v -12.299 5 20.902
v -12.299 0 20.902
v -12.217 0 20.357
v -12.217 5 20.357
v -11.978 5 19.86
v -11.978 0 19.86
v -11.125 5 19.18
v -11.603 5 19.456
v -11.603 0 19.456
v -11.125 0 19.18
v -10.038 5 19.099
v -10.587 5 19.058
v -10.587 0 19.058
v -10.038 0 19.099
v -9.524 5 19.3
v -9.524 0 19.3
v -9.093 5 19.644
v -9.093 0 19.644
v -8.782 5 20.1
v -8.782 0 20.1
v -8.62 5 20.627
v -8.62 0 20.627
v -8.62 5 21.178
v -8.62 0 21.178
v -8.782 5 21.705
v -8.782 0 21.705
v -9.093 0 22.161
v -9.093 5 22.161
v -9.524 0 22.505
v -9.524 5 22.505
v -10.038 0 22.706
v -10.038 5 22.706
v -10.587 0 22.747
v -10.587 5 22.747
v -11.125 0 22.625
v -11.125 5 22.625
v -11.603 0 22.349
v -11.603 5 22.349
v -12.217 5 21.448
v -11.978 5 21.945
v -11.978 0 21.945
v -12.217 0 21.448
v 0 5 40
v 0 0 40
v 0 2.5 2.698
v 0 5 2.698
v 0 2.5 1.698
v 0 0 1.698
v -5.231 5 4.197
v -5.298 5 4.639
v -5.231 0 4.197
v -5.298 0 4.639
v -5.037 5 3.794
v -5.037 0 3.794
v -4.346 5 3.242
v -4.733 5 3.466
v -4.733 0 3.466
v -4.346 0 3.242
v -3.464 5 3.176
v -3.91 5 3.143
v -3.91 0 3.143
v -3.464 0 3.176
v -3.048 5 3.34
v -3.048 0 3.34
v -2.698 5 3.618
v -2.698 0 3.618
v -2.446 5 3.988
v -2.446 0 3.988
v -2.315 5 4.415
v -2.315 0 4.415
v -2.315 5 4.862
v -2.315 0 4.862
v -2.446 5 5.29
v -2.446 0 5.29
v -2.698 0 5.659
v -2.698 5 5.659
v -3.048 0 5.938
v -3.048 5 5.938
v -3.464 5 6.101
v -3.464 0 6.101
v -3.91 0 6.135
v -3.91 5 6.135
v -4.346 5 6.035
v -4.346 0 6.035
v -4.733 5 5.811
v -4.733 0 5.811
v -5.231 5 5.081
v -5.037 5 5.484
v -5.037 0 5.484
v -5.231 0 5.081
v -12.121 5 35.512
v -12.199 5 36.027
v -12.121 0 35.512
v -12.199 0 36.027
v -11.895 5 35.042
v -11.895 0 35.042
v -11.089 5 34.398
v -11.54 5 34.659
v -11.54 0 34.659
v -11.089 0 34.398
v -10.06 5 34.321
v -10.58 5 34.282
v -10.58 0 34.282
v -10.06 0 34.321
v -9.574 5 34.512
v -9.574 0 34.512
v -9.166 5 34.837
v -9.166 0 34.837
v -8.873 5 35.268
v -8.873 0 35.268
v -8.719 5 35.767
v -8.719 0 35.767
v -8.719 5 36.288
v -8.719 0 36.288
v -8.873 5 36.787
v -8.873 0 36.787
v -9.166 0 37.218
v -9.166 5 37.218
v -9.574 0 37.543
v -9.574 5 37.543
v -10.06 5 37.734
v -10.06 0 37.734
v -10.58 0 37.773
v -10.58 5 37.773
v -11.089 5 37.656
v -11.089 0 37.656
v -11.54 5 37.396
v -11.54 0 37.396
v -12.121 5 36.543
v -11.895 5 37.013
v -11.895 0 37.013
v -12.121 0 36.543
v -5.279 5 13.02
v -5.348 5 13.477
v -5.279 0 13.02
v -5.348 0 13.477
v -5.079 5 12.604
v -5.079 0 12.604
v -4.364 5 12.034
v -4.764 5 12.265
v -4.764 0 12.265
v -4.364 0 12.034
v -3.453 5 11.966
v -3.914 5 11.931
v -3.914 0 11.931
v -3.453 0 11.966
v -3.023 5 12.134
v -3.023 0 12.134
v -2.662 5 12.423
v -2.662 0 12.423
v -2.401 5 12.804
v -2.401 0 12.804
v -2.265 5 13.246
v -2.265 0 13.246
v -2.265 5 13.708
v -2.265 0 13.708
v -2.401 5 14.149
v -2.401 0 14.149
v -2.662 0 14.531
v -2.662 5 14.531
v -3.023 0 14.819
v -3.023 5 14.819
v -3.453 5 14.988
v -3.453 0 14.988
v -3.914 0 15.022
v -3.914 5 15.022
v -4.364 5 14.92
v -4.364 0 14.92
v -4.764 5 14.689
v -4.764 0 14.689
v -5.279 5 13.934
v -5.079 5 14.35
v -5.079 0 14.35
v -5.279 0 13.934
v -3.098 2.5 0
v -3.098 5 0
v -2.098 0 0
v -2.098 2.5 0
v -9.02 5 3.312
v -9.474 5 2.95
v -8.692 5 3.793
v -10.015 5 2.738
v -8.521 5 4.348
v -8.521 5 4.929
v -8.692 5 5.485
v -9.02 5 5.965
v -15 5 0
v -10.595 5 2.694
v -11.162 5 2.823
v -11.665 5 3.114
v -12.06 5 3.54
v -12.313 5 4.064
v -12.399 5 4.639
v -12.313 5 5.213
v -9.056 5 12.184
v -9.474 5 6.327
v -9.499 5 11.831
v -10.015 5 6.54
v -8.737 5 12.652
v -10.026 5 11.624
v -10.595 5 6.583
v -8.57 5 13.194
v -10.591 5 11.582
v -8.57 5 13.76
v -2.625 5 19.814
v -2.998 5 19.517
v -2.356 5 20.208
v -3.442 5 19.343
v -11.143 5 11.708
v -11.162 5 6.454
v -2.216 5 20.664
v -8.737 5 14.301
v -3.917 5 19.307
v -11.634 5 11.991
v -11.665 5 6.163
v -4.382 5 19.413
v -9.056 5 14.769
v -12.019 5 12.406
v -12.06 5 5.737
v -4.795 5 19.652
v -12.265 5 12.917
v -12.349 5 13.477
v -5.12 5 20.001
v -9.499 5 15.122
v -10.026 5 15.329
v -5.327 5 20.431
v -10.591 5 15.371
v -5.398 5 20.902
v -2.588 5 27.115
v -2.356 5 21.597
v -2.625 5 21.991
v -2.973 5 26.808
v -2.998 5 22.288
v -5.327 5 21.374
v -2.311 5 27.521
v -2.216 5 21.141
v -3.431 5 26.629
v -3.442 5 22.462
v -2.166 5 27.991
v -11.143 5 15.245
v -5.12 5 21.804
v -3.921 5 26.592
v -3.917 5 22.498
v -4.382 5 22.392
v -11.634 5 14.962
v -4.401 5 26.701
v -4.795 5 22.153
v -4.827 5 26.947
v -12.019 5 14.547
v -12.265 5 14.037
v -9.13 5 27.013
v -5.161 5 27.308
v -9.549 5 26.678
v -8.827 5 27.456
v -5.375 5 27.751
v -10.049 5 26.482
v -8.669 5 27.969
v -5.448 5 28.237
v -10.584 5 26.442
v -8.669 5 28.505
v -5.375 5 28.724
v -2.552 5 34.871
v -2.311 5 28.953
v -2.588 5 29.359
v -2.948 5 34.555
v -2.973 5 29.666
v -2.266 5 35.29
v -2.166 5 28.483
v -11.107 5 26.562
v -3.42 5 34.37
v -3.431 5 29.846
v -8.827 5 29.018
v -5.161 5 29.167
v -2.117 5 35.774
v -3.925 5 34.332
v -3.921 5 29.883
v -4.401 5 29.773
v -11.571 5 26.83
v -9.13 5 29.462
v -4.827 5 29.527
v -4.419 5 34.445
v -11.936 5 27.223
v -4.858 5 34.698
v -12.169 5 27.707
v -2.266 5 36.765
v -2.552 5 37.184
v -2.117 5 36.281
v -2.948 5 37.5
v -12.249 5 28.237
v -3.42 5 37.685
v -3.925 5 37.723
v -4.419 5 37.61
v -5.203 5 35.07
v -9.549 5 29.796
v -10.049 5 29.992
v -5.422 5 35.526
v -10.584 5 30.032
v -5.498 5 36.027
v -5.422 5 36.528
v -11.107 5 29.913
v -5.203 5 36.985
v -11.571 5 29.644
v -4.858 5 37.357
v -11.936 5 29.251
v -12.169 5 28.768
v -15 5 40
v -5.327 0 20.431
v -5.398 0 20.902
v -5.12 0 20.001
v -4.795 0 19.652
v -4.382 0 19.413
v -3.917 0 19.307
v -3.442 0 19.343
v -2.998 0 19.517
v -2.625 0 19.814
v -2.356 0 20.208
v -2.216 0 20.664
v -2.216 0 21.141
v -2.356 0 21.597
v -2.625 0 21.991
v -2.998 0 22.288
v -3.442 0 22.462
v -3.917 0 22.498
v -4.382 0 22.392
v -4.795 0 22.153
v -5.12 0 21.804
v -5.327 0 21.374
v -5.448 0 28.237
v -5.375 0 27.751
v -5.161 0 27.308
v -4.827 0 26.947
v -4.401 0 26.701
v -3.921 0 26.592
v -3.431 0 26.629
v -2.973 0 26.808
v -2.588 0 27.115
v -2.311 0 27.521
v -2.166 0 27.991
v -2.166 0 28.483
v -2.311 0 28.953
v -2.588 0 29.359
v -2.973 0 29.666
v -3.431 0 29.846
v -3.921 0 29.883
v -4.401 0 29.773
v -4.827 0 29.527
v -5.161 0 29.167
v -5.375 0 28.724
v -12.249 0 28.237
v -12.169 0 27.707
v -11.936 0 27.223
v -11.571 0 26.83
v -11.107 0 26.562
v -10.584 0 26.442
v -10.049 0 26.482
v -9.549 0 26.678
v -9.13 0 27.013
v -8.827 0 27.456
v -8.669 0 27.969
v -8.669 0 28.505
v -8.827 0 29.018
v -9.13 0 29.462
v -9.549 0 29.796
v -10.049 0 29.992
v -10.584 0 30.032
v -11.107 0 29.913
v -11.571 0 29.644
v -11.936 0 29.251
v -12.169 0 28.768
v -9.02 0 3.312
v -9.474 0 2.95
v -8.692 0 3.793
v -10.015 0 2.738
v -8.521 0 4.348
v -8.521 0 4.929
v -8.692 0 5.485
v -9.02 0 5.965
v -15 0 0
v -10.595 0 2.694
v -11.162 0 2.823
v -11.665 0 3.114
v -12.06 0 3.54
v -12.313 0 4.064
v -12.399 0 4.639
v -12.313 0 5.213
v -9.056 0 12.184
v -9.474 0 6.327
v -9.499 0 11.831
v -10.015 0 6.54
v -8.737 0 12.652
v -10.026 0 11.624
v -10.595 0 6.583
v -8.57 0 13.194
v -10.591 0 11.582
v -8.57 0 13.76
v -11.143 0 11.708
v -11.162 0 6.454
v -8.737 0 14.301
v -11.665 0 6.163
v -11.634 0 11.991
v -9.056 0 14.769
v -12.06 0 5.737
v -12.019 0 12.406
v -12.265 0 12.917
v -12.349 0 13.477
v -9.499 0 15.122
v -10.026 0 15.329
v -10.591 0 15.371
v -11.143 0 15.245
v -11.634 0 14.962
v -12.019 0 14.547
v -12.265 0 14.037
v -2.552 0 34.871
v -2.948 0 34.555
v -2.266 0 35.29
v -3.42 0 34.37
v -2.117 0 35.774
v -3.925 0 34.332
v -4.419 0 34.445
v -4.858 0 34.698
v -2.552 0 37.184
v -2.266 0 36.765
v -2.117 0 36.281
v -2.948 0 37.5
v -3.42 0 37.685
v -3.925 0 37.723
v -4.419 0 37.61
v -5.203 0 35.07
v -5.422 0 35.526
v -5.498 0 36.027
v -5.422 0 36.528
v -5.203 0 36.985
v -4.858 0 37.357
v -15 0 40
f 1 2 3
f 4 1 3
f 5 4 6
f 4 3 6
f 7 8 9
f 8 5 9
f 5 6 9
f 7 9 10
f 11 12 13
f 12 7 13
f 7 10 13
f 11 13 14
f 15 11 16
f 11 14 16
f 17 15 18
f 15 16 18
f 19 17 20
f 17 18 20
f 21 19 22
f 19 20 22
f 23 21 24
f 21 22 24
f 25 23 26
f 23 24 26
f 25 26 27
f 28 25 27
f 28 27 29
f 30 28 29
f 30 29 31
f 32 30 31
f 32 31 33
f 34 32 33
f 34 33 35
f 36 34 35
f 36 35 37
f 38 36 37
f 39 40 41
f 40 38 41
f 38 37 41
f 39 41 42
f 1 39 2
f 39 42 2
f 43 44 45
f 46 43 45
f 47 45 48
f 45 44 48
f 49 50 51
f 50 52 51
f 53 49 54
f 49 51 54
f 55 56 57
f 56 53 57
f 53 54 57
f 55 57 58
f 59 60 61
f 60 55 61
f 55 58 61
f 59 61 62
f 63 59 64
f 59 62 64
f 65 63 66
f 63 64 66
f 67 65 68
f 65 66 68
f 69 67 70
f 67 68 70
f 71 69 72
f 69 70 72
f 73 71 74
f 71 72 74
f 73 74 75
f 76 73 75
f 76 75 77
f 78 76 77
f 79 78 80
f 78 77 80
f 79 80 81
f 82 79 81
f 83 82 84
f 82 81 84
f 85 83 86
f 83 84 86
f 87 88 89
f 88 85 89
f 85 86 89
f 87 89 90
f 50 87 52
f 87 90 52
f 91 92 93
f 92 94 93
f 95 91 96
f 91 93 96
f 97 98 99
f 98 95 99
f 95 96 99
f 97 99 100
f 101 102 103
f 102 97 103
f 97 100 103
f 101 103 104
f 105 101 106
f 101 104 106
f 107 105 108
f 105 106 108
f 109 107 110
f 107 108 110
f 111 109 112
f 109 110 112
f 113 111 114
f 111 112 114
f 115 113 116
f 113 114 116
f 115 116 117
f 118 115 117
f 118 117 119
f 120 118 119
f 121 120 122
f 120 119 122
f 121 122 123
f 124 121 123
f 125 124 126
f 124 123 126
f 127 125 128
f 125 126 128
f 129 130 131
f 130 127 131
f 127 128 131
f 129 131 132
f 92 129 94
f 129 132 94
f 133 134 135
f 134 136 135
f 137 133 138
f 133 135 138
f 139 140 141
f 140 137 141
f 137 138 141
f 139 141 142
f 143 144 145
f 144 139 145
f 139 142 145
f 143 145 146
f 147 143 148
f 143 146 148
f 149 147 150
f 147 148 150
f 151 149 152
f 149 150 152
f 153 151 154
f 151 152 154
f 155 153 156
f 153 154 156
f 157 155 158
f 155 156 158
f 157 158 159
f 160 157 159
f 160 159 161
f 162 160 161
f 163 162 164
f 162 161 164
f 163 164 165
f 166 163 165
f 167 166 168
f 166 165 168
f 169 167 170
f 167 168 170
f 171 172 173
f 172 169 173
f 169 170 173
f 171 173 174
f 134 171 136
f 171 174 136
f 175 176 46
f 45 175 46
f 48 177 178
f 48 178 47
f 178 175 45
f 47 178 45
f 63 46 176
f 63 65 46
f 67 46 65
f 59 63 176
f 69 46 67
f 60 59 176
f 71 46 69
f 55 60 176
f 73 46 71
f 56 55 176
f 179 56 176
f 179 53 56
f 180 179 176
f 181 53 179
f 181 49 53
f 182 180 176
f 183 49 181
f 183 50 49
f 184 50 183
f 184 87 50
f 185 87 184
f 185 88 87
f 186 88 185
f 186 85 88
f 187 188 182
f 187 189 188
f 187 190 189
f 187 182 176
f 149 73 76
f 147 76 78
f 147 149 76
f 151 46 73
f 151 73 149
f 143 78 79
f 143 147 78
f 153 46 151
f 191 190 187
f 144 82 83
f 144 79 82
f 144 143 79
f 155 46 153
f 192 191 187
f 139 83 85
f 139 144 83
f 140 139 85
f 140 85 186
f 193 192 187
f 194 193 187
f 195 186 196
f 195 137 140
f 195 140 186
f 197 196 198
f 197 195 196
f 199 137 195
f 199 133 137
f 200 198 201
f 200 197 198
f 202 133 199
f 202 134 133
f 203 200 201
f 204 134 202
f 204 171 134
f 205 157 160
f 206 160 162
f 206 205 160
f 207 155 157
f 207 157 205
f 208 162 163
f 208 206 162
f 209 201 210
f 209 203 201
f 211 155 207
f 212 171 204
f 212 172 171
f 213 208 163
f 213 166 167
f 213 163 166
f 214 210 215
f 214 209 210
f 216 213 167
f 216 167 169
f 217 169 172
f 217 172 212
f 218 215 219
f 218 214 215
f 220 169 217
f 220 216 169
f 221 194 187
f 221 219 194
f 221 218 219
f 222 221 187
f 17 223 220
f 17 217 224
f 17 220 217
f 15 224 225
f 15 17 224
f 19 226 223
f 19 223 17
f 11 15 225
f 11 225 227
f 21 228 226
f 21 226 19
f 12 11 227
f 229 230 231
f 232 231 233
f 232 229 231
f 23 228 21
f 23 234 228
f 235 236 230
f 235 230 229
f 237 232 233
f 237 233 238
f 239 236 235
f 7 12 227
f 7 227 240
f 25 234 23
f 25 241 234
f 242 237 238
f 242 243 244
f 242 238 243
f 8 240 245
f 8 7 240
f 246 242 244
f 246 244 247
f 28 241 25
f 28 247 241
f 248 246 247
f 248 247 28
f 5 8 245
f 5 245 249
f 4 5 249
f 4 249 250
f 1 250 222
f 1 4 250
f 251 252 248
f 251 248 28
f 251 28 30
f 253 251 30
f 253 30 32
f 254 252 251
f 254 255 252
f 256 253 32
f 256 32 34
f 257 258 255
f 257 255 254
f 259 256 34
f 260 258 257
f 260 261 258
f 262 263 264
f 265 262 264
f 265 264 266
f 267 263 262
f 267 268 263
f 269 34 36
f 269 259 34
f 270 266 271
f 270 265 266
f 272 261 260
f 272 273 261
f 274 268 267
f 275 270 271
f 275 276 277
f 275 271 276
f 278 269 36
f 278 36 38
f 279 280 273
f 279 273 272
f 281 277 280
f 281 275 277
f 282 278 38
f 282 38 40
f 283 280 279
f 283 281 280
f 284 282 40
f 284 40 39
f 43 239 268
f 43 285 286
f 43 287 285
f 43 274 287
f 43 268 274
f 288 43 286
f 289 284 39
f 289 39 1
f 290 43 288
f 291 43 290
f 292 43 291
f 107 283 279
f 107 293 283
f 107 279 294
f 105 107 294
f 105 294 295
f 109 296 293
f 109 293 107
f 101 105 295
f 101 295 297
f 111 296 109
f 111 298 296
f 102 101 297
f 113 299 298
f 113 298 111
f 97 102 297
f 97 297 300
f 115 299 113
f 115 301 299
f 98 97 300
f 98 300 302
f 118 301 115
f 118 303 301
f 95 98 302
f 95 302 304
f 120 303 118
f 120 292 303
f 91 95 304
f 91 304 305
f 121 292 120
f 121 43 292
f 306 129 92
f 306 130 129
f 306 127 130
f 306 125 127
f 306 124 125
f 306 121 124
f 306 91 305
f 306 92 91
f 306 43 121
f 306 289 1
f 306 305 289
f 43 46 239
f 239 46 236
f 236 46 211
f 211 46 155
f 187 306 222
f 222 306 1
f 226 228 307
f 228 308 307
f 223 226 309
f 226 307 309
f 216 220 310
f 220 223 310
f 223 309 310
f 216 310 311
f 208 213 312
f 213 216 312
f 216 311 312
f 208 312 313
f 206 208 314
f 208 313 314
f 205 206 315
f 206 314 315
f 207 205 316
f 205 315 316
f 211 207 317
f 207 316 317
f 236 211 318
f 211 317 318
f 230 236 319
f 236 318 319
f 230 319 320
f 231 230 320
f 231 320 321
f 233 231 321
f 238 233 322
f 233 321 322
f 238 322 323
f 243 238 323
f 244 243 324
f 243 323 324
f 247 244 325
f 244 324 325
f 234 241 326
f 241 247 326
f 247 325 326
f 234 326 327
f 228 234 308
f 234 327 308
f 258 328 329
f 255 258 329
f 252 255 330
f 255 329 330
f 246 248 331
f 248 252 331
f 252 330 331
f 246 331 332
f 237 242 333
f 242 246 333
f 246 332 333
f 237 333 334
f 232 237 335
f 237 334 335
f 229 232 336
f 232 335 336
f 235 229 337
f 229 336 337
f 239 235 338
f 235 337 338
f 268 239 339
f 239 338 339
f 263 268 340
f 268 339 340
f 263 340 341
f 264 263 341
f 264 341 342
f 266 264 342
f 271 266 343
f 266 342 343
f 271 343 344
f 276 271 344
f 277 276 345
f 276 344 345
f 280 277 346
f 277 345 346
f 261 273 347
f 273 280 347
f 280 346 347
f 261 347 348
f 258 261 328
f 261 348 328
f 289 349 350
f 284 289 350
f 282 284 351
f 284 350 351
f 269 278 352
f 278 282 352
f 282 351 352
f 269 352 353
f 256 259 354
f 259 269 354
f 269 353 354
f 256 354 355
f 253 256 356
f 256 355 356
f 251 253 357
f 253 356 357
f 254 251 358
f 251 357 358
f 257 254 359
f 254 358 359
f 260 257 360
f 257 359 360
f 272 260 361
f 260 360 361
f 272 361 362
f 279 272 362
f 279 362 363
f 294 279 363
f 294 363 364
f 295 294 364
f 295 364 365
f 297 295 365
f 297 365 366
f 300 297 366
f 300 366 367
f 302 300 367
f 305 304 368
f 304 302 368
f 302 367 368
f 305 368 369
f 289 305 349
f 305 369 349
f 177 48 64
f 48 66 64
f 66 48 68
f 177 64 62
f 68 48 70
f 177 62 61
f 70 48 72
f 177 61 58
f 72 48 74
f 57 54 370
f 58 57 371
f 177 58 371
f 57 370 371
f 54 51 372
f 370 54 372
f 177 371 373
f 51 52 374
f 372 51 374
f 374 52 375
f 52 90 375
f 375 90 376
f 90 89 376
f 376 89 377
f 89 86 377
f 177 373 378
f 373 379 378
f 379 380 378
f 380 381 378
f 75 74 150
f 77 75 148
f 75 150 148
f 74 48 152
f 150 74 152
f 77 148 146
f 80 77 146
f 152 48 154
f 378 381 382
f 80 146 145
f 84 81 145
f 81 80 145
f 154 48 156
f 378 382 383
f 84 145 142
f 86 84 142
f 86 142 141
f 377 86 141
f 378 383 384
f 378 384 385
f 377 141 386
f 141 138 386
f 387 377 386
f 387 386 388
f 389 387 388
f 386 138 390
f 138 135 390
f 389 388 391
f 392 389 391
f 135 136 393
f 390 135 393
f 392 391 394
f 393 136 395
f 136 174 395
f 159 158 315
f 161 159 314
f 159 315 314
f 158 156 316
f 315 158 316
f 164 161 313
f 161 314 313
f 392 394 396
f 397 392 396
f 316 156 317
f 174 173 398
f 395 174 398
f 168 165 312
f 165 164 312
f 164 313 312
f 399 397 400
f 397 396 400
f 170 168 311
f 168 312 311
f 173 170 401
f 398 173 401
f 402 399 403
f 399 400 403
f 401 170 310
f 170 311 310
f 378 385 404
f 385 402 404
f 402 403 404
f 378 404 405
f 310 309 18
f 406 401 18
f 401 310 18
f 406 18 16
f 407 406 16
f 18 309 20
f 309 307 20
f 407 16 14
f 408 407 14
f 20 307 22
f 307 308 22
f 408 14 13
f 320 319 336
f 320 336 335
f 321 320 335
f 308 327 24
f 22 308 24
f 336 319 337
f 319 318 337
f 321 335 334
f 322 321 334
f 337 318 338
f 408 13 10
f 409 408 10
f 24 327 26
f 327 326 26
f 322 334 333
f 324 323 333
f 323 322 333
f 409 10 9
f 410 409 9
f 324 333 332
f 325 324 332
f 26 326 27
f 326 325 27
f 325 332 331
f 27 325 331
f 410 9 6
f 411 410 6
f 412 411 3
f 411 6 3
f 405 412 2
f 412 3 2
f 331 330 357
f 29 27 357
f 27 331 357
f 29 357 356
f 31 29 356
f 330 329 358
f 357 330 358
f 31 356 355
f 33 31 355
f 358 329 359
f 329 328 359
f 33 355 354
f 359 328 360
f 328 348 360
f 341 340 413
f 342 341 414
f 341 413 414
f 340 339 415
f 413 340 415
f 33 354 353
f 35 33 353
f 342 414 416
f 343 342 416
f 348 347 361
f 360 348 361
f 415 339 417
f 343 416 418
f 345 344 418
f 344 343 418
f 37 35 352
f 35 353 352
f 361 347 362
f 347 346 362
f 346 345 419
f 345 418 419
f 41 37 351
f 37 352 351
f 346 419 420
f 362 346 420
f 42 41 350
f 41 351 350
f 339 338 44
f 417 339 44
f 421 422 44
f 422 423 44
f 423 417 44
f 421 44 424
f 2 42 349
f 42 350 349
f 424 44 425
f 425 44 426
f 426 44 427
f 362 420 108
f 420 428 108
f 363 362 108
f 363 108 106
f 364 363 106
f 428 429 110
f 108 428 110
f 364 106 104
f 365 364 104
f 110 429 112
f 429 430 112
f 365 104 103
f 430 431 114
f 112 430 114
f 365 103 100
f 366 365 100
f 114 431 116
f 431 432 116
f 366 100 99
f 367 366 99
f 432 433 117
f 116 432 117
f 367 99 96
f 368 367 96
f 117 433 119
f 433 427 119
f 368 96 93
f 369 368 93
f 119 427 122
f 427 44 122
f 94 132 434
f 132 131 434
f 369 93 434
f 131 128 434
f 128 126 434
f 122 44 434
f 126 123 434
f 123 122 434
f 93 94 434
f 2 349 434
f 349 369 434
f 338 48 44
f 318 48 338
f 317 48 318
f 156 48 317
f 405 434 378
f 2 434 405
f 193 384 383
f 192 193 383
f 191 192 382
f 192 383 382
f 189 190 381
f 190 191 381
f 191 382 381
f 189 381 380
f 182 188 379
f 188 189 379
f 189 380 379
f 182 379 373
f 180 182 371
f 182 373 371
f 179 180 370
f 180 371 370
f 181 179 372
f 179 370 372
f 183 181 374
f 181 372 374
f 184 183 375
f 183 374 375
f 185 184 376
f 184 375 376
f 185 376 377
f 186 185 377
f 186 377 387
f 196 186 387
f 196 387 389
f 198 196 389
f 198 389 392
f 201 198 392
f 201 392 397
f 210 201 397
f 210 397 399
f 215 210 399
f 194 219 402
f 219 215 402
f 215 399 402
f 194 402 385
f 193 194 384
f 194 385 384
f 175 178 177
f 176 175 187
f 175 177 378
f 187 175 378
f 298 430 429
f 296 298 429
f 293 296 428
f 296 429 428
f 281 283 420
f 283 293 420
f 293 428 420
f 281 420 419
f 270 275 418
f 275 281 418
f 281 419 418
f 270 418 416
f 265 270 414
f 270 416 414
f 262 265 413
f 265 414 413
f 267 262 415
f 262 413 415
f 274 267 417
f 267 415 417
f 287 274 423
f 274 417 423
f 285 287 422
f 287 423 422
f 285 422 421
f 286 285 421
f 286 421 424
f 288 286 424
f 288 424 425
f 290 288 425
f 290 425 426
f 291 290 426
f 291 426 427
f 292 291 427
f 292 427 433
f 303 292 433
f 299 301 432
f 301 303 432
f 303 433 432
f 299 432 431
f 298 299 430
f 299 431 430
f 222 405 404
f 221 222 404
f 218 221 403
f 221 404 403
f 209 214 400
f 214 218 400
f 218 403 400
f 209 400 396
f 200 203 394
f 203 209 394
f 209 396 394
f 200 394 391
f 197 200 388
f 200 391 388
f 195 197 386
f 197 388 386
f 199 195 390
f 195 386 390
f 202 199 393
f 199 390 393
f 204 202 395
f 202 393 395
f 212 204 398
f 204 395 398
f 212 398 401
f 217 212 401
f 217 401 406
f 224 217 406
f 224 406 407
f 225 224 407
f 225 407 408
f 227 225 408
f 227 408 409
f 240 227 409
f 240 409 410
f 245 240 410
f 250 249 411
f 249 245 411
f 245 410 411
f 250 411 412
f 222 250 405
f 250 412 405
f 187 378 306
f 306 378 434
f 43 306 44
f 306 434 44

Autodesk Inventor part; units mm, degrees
ref_plane "YZ Plane" through (0, 0, 0) normal (1, 0, 0) x (0, 1, 0)
ref_plane "XZ Plane" through (0, 0, 0) normal (0, 1, 0) x (-1, 0, 0)
ref_plane "XY Plane" through (0, 0, 0) normal (0, 0, 1) x (1, 0, 0)
sketch "Sketch1" plane through (0, 0, 0) normal (0, 1, 0) x (-1, 0, 0)
  line L0 (0, 0) -> (15, 0)
  line L1 (15, 0) -> (15, 40)
  line L2 (15, 40) -> (0, 40)
  line L3 (0, 40) -> (0, 0)
  circle A0 centre (3.7979, 4.6387) radius 1.5
  circle A1 centre (3.7979, 13.4768) radius 1.55
  circle A2 centre (3.7979, 20.9025) radius 1.6
  circle A3 centre (3.7979, 28.2372) radius 1.65
  circle A4 centre (3.7979, 36.0274) radius 1.7
  circle A5 centre (10.4492, 36.0274) radius 1.75
  circle A6 centre (10.4492, 28.2372) radius 1.8
  circle A7 centre (10.4492, 20.9025) radius 1.85
  circle A8 centre (10.4492, 13.4768) radius 1.9
  circle A9 centre (10.4492, 4.6387) radius 1.95
  line L4 (2.0979, 0) -> (0, 1.698)
  point P0 (7.5, 40)
  dimension "d0" = 3
  dimension "d1" = 3.1
  dimension "d2" = 3.2
  dimension "d3" = 3.3
  dimension "d4" = 3.4
  dimension "d5" = 3.5
  dimension "d6" = 3.6
  dimension "d7" = 3.7
  dimension "d8" = 3.8
  dimension "d9" = 3.9
  dimension "d10" = 40
  dimension "d11" = 15
extrude "Extrusion1" add sketch "Sketch1" along normal blind 5 contours L4 L3 L2 L1 L0
sketch "Sketch2" plane through (0, 5, 0) normal (0, 1, 0) x (1, 0, 0)
  line L0 (0, -40) -> (0, -1.698) projected
  line L1 (0, -1.698) -> (-2.0979, 0) projected
  line L2 (-2.0979, 0) -> (0, -1.698)
  line L3 (0, -1.698) -> (0, -2.698)
  line L4 (-2.0979, 0) -> (-3.0979, 0)
  line L5 (-2.0979, 0) -> (-15, 0) projected
  line L6 (-3.0979, 0) -> (0, -2.698)
  point P0 (0, 0)
  dimension "d14" = 1
  dimension "d15" = 1
extrude "Extrusion2" cut sketch "Sketch2" against normal blind 2.5
properties part number "m3_sizing_tests"
